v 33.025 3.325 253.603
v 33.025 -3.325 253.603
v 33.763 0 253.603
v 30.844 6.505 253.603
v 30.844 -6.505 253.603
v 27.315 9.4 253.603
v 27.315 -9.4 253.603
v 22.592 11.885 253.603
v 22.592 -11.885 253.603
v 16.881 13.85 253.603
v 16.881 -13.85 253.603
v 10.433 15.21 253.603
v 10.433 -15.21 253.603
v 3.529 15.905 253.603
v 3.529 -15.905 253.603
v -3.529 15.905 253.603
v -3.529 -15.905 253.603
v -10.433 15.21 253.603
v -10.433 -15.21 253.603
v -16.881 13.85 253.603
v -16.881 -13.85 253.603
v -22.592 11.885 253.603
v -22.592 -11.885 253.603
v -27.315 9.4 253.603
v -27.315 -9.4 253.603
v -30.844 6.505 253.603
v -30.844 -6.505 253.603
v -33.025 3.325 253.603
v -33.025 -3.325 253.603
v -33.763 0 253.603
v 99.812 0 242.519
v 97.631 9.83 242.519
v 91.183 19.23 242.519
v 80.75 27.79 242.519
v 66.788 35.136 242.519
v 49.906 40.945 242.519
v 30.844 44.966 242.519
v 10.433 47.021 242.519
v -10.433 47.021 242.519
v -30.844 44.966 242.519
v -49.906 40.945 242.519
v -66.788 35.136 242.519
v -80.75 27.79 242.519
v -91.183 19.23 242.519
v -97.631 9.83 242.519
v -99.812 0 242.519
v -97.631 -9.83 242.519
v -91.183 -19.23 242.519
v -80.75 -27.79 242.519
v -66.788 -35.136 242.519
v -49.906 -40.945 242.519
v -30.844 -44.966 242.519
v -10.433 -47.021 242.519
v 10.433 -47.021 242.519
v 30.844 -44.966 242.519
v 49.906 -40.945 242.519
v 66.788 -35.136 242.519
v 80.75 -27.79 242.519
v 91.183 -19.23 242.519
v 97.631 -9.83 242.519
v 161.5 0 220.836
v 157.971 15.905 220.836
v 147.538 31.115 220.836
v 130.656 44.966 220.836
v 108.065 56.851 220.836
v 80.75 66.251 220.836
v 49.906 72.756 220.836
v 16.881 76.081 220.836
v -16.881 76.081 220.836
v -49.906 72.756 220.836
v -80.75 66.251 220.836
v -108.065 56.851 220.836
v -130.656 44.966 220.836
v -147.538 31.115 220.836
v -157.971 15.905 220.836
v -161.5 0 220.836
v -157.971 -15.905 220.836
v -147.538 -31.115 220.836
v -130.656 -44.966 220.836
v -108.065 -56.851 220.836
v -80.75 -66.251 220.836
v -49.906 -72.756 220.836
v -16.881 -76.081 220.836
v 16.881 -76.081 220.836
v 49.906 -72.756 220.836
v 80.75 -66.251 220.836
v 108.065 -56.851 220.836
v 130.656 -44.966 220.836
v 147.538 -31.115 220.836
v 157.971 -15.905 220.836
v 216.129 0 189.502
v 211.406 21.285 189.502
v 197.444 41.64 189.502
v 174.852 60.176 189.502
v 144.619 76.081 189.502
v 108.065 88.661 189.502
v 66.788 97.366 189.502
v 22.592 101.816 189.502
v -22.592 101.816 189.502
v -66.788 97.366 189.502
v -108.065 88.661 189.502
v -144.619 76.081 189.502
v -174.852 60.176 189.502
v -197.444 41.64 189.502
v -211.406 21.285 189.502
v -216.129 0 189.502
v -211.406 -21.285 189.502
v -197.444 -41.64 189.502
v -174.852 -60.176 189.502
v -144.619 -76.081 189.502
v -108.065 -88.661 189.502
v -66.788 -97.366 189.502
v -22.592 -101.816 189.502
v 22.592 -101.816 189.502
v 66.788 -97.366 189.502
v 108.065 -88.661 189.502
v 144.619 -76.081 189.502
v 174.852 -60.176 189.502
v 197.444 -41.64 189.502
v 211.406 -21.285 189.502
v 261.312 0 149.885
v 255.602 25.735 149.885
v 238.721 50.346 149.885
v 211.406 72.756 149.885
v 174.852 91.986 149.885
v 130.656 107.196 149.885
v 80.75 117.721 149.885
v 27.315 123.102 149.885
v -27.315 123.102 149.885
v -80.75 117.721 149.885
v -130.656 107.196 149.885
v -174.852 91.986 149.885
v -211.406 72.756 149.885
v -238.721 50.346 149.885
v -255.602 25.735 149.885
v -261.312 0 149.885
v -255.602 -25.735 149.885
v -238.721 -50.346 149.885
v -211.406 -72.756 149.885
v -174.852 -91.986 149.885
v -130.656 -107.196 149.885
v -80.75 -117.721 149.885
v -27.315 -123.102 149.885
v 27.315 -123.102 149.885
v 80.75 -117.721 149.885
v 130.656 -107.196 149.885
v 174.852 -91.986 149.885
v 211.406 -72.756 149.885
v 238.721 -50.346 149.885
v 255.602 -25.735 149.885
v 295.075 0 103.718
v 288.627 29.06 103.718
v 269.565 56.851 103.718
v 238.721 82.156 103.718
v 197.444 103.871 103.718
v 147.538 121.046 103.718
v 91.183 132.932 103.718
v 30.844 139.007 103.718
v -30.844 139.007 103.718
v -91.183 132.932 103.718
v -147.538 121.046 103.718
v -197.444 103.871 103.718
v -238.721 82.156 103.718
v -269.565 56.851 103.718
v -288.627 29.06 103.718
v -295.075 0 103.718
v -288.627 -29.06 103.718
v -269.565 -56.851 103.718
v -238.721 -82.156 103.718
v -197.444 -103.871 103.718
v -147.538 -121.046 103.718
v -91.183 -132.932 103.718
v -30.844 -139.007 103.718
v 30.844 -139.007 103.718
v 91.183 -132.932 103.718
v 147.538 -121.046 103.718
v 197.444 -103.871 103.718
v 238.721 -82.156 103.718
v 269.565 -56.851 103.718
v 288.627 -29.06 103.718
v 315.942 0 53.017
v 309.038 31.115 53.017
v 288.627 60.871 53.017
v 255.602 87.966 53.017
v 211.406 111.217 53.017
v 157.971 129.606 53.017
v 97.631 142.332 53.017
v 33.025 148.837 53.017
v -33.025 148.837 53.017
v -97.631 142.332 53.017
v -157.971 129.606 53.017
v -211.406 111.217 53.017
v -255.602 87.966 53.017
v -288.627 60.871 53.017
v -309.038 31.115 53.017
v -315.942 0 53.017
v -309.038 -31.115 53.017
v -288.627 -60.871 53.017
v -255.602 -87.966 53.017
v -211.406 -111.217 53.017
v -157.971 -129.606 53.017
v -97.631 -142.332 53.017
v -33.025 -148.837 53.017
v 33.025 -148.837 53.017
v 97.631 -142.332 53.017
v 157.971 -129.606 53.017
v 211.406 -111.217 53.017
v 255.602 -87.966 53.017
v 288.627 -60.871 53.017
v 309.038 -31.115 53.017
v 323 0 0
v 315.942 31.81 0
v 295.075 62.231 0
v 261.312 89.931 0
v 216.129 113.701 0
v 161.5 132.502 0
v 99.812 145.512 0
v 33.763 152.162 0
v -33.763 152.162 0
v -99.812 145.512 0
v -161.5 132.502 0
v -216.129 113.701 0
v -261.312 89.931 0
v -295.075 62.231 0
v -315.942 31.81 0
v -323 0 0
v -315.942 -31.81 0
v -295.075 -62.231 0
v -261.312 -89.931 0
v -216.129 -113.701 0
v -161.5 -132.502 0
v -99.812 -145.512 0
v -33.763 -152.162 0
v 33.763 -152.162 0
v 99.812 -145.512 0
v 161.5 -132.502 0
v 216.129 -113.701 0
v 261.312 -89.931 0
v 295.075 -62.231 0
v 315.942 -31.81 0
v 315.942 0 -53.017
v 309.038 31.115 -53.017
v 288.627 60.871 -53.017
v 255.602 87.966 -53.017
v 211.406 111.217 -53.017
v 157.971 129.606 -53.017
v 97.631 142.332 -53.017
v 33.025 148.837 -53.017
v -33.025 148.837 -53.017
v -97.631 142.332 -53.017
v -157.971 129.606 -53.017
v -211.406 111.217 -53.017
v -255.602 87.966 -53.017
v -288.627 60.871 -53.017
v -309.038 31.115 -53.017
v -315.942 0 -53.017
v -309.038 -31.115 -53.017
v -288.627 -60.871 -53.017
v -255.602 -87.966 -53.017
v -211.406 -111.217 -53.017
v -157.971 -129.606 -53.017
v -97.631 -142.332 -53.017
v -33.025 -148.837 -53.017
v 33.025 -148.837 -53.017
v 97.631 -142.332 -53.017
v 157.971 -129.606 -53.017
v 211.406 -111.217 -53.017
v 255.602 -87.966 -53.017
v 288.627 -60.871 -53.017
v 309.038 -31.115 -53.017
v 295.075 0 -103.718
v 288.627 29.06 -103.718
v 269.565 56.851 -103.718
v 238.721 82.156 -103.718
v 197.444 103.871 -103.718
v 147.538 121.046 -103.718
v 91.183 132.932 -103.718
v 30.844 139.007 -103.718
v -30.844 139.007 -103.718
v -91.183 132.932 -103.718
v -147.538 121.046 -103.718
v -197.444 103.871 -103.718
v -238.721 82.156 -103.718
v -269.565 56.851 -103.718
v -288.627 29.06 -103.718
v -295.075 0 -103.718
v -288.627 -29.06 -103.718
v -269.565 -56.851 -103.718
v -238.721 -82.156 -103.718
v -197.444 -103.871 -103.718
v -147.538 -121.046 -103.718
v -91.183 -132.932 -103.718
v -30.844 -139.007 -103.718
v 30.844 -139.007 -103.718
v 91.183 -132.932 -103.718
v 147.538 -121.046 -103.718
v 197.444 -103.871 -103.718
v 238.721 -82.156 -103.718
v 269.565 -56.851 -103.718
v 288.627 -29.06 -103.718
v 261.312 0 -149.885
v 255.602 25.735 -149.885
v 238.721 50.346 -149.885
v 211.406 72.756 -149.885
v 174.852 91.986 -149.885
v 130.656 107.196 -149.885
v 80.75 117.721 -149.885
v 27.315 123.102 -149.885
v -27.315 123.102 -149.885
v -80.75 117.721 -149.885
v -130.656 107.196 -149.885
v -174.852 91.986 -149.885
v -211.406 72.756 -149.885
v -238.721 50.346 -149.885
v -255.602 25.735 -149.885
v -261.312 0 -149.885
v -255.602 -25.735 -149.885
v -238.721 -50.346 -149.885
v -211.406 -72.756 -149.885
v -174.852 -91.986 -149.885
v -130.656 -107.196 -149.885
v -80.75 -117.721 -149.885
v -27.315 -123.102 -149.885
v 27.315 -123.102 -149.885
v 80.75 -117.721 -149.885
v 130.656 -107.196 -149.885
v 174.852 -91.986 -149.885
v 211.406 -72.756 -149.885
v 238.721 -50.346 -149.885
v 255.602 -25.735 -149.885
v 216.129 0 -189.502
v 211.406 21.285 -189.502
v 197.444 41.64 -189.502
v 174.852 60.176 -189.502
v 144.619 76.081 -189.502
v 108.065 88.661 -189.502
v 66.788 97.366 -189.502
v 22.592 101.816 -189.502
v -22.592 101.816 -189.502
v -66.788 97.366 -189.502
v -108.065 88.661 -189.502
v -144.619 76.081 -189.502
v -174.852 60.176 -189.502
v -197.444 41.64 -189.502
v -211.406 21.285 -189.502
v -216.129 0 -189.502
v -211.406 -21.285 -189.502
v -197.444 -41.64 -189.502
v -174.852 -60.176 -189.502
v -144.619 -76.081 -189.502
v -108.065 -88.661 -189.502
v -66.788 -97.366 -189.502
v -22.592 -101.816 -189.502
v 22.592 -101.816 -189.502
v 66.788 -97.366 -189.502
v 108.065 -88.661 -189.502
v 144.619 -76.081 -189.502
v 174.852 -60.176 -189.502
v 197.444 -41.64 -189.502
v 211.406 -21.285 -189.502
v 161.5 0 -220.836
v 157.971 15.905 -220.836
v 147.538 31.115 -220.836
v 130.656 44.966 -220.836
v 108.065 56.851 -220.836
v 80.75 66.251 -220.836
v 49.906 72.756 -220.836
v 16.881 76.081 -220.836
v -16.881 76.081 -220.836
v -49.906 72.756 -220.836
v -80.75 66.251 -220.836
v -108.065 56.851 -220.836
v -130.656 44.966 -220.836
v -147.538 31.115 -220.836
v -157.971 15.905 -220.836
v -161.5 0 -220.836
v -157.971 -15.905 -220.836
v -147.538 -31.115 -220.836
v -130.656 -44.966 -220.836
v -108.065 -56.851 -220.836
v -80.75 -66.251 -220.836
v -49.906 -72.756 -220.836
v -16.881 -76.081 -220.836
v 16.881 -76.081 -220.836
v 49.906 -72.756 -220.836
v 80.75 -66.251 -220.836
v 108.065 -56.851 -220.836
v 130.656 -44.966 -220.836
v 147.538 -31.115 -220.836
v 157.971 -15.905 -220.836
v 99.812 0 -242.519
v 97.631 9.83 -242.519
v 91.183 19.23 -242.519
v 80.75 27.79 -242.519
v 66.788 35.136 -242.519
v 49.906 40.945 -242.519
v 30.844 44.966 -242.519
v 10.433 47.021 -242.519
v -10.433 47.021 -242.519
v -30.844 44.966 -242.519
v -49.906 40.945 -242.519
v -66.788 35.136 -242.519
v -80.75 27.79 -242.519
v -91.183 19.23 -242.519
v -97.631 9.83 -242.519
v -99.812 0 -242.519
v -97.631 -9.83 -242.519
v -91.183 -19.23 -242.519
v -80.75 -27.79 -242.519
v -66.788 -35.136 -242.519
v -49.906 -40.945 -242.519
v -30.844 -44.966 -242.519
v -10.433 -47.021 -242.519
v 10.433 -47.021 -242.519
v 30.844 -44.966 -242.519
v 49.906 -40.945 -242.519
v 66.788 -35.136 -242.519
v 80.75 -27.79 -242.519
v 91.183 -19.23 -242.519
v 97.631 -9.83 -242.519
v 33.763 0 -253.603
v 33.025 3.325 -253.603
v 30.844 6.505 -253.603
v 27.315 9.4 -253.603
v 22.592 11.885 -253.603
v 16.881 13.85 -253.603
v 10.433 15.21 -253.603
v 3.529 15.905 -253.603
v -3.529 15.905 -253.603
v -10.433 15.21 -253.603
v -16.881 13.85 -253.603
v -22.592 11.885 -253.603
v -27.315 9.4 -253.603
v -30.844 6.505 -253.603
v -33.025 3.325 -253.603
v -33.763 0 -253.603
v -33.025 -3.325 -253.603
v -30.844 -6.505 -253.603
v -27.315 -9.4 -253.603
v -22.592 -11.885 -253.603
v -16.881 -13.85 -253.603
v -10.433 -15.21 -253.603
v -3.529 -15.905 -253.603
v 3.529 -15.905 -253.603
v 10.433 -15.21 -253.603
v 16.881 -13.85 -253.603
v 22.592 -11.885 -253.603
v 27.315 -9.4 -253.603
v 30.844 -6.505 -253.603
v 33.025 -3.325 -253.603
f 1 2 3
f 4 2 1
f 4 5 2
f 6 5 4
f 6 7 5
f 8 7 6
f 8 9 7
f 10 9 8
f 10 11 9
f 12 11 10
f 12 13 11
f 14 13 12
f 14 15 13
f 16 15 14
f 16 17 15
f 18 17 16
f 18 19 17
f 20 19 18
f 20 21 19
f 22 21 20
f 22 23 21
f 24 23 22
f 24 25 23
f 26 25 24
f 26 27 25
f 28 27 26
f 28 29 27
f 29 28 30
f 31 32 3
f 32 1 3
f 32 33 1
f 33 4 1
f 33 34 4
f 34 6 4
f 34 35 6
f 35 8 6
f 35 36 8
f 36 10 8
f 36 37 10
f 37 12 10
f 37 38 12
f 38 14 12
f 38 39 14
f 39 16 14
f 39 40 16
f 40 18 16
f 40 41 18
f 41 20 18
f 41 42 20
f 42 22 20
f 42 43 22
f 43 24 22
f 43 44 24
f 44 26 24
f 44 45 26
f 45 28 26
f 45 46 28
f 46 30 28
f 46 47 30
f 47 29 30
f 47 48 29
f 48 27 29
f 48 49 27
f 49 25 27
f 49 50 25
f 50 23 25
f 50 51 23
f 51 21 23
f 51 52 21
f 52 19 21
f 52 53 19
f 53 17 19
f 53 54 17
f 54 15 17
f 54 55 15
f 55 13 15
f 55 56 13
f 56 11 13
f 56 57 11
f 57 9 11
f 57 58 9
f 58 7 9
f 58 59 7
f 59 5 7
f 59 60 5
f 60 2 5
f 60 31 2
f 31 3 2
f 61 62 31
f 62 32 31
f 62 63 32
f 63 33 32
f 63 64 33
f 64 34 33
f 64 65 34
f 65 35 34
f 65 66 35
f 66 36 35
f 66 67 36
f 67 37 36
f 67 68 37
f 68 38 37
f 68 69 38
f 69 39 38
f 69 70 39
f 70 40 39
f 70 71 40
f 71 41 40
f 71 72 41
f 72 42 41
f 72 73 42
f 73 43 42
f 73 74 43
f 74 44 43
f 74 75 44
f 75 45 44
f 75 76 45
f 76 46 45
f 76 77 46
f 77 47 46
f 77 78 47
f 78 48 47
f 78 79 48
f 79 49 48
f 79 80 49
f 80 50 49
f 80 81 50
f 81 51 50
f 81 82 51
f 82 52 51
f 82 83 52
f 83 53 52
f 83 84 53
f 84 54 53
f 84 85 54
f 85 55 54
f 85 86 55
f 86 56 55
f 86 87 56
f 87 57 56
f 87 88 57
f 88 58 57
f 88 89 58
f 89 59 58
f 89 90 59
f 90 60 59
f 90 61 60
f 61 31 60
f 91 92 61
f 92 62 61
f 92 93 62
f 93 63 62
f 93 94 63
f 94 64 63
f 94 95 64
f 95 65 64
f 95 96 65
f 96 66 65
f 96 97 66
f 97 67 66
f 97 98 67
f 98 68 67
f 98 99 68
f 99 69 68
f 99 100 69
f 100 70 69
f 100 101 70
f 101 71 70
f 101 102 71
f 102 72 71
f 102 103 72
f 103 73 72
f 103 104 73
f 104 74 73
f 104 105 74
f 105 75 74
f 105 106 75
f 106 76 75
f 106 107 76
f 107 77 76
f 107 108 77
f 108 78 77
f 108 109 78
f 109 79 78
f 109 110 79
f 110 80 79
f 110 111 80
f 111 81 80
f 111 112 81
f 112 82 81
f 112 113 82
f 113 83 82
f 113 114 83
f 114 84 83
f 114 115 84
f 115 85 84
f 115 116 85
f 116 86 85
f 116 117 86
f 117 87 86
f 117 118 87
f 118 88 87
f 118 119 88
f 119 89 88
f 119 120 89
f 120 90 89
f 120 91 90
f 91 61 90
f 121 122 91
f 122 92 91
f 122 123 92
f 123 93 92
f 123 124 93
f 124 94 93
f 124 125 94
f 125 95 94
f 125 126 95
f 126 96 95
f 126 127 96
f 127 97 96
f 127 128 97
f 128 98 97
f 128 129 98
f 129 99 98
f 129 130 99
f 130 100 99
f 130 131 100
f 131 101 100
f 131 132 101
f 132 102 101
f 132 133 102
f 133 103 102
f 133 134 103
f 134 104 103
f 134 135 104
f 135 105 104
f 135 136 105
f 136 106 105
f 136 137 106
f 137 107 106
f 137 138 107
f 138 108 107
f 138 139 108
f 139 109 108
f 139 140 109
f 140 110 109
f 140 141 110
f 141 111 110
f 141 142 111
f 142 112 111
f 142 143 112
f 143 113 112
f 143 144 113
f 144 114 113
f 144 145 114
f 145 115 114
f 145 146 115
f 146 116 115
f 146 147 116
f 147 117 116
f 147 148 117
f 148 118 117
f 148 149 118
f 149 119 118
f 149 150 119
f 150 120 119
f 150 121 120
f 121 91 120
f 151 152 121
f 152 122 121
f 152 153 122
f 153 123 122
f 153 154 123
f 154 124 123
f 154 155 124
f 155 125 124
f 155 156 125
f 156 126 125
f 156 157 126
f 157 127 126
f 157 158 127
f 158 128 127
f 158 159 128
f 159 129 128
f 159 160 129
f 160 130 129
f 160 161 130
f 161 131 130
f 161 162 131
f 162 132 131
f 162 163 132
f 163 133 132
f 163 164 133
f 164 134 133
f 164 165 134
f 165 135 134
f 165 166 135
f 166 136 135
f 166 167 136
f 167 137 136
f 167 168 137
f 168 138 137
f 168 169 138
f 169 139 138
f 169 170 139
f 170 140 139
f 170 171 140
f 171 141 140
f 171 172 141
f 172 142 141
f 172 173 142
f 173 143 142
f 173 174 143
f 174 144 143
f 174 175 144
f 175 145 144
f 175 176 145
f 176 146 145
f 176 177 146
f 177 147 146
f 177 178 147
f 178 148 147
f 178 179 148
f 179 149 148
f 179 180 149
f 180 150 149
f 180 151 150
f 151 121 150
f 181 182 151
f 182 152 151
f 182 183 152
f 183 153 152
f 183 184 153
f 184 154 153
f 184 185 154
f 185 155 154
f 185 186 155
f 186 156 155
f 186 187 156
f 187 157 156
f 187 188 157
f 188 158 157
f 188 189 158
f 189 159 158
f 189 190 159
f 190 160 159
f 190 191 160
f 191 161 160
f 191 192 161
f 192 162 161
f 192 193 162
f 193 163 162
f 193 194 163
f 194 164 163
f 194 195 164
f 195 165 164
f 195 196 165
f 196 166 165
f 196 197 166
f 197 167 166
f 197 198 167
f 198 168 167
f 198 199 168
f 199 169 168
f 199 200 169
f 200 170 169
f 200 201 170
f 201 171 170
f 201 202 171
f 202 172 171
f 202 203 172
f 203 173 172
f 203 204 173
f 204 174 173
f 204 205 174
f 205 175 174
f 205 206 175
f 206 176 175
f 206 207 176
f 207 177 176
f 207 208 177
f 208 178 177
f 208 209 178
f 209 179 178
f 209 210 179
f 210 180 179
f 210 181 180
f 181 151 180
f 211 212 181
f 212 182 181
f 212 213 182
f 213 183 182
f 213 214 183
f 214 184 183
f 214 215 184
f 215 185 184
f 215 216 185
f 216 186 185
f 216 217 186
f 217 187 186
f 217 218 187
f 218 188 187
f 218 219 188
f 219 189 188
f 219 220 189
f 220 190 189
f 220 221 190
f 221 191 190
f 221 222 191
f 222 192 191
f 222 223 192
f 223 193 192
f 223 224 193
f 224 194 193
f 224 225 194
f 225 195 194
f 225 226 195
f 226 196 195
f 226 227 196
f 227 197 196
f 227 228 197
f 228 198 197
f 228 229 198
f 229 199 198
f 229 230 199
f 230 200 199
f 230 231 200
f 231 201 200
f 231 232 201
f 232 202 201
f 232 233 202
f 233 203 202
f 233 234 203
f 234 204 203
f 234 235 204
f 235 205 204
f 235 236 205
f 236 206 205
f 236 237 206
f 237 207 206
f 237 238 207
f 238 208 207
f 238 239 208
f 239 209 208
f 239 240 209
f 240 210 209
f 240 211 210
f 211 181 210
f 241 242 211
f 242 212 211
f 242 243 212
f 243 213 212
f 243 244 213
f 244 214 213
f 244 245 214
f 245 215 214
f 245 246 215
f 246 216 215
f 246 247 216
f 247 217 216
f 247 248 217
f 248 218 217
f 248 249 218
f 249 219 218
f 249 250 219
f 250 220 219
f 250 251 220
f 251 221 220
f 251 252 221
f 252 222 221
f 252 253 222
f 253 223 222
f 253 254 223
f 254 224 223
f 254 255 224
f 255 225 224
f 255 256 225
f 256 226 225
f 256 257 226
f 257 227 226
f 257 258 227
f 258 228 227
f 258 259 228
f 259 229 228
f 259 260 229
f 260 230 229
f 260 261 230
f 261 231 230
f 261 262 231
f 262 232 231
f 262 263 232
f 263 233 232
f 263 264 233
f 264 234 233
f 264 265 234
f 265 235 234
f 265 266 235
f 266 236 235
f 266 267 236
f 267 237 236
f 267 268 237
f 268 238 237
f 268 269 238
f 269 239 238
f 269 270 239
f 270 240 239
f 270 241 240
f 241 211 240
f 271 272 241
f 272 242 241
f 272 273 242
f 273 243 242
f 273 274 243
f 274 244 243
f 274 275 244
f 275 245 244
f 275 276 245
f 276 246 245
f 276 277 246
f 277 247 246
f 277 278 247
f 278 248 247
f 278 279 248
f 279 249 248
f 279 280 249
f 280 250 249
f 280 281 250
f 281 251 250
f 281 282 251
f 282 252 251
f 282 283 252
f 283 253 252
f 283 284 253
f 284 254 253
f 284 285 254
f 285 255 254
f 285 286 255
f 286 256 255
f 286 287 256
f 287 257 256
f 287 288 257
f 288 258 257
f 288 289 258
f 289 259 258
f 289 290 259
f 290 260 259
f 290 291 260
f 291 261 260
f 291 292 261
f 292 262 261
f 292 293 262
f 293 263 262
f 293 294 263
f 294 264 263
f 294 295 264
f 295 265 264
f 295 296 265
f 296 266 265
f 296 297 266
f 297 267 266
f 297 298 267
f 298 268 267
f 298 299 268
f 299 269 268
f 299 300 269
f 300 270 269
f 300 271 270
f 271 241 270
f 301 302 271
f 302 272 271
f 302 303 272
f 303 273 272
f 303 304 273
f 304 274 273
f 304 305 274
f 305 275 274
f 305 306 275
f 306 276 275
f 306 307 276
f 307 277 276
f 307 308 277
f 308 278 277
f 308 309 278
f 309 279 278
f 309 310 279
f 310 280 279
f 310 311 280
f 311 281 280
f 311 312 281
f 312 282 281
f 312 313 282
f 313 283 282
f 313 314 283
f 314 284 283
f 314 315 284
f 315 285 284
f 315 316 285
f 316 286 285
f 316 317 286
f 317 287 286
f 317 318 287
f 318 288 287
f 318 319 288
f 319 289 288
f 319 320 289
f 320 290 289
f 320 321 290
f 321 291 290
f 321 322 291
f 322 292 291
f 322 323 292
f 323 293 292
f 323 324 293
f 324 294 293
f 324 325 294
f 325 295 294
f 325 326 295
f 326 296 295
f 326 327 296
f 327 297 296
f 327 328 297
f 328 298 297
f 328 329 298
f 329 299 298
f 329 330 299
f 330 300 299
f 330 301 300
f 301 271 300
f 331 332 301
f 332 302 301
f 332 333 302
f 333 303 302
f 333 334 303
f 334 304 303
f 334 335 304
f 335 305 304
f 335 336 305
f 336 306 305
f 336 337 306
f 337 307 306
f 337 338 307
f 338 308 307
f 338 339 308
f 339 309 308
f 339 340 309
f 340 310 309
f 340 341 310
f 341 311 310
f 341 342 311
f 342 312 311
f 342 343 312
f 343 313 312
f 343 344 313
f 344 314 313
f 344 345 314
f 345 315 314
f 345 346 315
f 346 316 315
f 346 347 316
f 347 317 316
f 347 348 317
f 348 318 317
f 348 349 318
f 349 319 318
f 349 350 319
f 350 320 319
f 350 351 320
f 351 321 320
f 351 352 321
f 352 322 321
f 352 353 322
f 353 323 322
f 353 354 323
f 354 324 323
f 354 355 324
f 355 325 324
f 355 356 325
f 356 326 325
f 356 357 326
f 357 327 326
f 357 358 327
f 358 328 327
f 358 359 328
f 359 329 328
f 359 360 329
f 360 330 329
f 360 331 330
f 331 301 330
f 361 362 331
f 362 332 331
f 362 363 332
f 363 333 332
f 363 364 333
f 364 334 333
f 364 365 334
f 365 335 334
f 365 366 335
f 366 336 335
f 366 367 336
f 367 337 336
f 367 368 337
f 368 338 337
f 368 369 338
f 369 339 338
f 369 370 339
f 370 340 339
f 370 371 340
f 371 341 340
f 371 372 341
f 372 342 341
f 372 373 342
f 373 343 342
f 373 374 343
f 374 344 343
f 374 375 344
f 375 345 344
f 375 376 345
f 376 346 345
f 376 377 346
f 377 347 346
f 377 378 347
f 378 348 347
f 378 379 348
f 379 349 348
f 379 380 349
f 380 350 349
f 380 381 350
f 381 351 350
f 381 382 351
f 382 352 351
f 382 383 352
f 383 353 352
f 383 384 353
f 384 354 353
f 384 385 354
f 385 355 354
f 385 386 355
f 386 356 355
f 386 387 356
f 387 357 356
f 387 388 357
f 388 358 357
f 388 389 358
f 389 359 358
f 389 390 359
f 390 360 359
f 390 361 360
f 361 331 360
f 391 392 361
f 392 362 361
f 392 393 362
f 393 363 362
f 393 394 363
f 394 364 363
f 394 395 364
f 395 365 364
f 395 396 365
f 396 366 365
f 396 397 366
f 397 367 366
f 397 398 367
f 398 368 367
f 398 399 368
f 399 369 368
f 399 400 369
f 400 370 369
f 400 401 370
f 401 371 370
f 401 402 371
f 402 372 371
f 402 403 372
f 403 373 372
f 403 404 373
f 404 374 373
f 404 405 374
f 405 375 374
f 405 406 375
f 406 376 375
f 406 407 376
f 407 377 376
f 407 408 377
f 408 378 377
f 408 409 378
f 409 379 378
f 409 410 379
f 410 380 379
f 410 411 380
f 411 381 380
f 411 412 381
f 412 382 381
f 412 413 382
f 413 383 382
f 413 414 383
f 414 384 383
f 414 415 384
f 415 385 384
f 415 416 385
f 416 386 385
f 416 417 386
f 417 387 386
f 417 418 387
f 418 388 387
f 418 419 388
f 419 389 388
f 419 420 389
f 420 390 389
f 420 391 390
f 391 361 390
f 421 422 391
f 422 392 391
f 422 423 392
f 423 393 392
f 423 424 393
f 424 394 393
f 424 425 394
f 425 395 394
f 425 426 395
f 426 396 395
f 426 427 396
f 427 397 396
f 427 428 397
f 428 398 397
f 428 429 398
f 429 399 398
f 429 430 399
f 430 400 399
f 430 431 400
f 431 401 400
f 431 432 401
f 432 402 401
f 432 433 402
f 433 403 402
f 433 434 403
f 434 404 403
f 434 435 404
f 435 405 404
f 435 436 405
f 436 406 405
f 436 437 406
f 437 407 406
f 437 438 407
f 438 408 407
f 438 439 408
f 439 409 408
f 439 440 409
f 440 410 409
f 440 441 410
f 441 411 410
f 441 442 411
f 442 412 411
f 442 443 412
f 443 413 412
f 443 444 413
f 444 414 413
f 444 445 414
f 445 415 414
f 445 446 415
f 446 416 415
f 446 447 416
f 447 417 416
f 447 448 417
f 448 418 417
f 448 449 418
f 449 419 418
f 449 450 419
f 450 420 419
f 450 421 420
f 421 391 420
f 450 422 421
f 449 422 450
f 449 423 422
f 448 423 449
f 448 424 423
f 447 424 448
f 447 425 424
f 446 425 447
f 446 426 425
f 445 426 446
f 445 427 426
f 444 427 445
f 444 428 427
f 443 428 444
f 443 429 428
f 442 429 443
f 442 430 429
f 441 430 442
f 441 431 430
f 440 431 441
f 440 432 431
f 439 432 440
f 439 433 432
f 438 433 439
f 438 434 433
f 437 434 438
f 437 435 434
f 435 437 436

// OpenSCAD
// Generated by SolidPython 1.0.1 on 2020-07-29 00:46:54


scale(v = [19, 9, 15]) {
	sphere(r = 17);
}
/***********************************************
*********      SolidPython code:      **********
************************************************
 
# import packages: SolidPython
from solid import *
from solid.utils import *
from itertools import chain, combinations, permutations


class Resize:

    def __init__(self, scad_file):
        self.scad_file = scad_file
        #self.scad_file = import_scad(scad_file)
        # cone/cylinder param:
        self.r1 = 0
        self.r2 = 0
        self.h = 0
        # rectangular prism param:
        self.w = 0
        self.l = 0
        # ellipse param:
        self.r = 0

    # import OpenScad code (file name corresponds to shape)


    # classify shape + parameters
    def assign(self, param1, param2, param3):
        if self.scad_file == 'cone.scad':
            self.r1 = param1
            self.r2 = param2
            self.h = param3
        elif self.scad_file == 'cylinder.scad':
            self.r1 = param1
            self.r2 = param2
            self.h = param3
        elif self.scad_file == 'rectangularPrism.scad':
            self.h = param1
            self.l = param2
            self.w = param3
        else:
            self.r = param1
            self.h = param2

    # resize parameters
    def iterate(self):
        x = range(3, 20, 2)
        i = 1
        if self.scad_file == 'cone.scad':
            tempList = list(permutations(x, 2))
            for temp in tempList:
                param1 = temp[0]
                param2 = temp[1]
                filepath = 'produced_scad_files/' + 'cone' + str(param1) + '_' + str(param2) + '_' + '.scad'
                scad_render_to_file(cylinder(h=param1, r1=param2, r2=0), filepath)

        elif self.scad_file == 'cylinder.scad':
            tempList = list(permutations(x, 3))
            for temp in tempList:
                param1 = temp[0]
                param2 = temp[1]
                filepath = 'produced_scad_files/' + 'cylinder' + str(param1) + '_' + str(param2) + '_' + '.scad'
                scad_render_to_file(cylinder(h=param1, r1=param2, r2=param2), filepath)

        elif self.scad_file == 'rectangularPrism.scad':
            tempList = list(permutations(x, 3))
            for temp in tempList:
                param1 = temp[0]
                param2 = temp[1]
                param3 = temp[2]
                filepath = 'produced_scad_files/' + 'rectangularPrism' + str(param1) + '_' + str(param2) + '_' + str(
                    param3) + '.scad'
                scad_render_to_file(cube(size=(param1, param2, param3)), filepath)

        elif self.scad_file == 'ellipse.scad':
            tempList = list(permutations(x, 4))
            for temp in tempList:
                param1 = temp[0]
                param2 = temp[1]
                param3 = temp[2]
                param4 = temp[3]
                filepath = 'produced_scad_files/' + 'ellipse' + str(param1) + '_' + str(param2) + '_' + str(param3) + '_' + str(param4) + '.scad'
                scad_render_to_file(scale([param1, param2, param3])(sphere(r=param4)), filepath)

    def render_to_scadfile(self):
        scad_render_to_file(scad, 'example.scad') 
 
************************************************/
